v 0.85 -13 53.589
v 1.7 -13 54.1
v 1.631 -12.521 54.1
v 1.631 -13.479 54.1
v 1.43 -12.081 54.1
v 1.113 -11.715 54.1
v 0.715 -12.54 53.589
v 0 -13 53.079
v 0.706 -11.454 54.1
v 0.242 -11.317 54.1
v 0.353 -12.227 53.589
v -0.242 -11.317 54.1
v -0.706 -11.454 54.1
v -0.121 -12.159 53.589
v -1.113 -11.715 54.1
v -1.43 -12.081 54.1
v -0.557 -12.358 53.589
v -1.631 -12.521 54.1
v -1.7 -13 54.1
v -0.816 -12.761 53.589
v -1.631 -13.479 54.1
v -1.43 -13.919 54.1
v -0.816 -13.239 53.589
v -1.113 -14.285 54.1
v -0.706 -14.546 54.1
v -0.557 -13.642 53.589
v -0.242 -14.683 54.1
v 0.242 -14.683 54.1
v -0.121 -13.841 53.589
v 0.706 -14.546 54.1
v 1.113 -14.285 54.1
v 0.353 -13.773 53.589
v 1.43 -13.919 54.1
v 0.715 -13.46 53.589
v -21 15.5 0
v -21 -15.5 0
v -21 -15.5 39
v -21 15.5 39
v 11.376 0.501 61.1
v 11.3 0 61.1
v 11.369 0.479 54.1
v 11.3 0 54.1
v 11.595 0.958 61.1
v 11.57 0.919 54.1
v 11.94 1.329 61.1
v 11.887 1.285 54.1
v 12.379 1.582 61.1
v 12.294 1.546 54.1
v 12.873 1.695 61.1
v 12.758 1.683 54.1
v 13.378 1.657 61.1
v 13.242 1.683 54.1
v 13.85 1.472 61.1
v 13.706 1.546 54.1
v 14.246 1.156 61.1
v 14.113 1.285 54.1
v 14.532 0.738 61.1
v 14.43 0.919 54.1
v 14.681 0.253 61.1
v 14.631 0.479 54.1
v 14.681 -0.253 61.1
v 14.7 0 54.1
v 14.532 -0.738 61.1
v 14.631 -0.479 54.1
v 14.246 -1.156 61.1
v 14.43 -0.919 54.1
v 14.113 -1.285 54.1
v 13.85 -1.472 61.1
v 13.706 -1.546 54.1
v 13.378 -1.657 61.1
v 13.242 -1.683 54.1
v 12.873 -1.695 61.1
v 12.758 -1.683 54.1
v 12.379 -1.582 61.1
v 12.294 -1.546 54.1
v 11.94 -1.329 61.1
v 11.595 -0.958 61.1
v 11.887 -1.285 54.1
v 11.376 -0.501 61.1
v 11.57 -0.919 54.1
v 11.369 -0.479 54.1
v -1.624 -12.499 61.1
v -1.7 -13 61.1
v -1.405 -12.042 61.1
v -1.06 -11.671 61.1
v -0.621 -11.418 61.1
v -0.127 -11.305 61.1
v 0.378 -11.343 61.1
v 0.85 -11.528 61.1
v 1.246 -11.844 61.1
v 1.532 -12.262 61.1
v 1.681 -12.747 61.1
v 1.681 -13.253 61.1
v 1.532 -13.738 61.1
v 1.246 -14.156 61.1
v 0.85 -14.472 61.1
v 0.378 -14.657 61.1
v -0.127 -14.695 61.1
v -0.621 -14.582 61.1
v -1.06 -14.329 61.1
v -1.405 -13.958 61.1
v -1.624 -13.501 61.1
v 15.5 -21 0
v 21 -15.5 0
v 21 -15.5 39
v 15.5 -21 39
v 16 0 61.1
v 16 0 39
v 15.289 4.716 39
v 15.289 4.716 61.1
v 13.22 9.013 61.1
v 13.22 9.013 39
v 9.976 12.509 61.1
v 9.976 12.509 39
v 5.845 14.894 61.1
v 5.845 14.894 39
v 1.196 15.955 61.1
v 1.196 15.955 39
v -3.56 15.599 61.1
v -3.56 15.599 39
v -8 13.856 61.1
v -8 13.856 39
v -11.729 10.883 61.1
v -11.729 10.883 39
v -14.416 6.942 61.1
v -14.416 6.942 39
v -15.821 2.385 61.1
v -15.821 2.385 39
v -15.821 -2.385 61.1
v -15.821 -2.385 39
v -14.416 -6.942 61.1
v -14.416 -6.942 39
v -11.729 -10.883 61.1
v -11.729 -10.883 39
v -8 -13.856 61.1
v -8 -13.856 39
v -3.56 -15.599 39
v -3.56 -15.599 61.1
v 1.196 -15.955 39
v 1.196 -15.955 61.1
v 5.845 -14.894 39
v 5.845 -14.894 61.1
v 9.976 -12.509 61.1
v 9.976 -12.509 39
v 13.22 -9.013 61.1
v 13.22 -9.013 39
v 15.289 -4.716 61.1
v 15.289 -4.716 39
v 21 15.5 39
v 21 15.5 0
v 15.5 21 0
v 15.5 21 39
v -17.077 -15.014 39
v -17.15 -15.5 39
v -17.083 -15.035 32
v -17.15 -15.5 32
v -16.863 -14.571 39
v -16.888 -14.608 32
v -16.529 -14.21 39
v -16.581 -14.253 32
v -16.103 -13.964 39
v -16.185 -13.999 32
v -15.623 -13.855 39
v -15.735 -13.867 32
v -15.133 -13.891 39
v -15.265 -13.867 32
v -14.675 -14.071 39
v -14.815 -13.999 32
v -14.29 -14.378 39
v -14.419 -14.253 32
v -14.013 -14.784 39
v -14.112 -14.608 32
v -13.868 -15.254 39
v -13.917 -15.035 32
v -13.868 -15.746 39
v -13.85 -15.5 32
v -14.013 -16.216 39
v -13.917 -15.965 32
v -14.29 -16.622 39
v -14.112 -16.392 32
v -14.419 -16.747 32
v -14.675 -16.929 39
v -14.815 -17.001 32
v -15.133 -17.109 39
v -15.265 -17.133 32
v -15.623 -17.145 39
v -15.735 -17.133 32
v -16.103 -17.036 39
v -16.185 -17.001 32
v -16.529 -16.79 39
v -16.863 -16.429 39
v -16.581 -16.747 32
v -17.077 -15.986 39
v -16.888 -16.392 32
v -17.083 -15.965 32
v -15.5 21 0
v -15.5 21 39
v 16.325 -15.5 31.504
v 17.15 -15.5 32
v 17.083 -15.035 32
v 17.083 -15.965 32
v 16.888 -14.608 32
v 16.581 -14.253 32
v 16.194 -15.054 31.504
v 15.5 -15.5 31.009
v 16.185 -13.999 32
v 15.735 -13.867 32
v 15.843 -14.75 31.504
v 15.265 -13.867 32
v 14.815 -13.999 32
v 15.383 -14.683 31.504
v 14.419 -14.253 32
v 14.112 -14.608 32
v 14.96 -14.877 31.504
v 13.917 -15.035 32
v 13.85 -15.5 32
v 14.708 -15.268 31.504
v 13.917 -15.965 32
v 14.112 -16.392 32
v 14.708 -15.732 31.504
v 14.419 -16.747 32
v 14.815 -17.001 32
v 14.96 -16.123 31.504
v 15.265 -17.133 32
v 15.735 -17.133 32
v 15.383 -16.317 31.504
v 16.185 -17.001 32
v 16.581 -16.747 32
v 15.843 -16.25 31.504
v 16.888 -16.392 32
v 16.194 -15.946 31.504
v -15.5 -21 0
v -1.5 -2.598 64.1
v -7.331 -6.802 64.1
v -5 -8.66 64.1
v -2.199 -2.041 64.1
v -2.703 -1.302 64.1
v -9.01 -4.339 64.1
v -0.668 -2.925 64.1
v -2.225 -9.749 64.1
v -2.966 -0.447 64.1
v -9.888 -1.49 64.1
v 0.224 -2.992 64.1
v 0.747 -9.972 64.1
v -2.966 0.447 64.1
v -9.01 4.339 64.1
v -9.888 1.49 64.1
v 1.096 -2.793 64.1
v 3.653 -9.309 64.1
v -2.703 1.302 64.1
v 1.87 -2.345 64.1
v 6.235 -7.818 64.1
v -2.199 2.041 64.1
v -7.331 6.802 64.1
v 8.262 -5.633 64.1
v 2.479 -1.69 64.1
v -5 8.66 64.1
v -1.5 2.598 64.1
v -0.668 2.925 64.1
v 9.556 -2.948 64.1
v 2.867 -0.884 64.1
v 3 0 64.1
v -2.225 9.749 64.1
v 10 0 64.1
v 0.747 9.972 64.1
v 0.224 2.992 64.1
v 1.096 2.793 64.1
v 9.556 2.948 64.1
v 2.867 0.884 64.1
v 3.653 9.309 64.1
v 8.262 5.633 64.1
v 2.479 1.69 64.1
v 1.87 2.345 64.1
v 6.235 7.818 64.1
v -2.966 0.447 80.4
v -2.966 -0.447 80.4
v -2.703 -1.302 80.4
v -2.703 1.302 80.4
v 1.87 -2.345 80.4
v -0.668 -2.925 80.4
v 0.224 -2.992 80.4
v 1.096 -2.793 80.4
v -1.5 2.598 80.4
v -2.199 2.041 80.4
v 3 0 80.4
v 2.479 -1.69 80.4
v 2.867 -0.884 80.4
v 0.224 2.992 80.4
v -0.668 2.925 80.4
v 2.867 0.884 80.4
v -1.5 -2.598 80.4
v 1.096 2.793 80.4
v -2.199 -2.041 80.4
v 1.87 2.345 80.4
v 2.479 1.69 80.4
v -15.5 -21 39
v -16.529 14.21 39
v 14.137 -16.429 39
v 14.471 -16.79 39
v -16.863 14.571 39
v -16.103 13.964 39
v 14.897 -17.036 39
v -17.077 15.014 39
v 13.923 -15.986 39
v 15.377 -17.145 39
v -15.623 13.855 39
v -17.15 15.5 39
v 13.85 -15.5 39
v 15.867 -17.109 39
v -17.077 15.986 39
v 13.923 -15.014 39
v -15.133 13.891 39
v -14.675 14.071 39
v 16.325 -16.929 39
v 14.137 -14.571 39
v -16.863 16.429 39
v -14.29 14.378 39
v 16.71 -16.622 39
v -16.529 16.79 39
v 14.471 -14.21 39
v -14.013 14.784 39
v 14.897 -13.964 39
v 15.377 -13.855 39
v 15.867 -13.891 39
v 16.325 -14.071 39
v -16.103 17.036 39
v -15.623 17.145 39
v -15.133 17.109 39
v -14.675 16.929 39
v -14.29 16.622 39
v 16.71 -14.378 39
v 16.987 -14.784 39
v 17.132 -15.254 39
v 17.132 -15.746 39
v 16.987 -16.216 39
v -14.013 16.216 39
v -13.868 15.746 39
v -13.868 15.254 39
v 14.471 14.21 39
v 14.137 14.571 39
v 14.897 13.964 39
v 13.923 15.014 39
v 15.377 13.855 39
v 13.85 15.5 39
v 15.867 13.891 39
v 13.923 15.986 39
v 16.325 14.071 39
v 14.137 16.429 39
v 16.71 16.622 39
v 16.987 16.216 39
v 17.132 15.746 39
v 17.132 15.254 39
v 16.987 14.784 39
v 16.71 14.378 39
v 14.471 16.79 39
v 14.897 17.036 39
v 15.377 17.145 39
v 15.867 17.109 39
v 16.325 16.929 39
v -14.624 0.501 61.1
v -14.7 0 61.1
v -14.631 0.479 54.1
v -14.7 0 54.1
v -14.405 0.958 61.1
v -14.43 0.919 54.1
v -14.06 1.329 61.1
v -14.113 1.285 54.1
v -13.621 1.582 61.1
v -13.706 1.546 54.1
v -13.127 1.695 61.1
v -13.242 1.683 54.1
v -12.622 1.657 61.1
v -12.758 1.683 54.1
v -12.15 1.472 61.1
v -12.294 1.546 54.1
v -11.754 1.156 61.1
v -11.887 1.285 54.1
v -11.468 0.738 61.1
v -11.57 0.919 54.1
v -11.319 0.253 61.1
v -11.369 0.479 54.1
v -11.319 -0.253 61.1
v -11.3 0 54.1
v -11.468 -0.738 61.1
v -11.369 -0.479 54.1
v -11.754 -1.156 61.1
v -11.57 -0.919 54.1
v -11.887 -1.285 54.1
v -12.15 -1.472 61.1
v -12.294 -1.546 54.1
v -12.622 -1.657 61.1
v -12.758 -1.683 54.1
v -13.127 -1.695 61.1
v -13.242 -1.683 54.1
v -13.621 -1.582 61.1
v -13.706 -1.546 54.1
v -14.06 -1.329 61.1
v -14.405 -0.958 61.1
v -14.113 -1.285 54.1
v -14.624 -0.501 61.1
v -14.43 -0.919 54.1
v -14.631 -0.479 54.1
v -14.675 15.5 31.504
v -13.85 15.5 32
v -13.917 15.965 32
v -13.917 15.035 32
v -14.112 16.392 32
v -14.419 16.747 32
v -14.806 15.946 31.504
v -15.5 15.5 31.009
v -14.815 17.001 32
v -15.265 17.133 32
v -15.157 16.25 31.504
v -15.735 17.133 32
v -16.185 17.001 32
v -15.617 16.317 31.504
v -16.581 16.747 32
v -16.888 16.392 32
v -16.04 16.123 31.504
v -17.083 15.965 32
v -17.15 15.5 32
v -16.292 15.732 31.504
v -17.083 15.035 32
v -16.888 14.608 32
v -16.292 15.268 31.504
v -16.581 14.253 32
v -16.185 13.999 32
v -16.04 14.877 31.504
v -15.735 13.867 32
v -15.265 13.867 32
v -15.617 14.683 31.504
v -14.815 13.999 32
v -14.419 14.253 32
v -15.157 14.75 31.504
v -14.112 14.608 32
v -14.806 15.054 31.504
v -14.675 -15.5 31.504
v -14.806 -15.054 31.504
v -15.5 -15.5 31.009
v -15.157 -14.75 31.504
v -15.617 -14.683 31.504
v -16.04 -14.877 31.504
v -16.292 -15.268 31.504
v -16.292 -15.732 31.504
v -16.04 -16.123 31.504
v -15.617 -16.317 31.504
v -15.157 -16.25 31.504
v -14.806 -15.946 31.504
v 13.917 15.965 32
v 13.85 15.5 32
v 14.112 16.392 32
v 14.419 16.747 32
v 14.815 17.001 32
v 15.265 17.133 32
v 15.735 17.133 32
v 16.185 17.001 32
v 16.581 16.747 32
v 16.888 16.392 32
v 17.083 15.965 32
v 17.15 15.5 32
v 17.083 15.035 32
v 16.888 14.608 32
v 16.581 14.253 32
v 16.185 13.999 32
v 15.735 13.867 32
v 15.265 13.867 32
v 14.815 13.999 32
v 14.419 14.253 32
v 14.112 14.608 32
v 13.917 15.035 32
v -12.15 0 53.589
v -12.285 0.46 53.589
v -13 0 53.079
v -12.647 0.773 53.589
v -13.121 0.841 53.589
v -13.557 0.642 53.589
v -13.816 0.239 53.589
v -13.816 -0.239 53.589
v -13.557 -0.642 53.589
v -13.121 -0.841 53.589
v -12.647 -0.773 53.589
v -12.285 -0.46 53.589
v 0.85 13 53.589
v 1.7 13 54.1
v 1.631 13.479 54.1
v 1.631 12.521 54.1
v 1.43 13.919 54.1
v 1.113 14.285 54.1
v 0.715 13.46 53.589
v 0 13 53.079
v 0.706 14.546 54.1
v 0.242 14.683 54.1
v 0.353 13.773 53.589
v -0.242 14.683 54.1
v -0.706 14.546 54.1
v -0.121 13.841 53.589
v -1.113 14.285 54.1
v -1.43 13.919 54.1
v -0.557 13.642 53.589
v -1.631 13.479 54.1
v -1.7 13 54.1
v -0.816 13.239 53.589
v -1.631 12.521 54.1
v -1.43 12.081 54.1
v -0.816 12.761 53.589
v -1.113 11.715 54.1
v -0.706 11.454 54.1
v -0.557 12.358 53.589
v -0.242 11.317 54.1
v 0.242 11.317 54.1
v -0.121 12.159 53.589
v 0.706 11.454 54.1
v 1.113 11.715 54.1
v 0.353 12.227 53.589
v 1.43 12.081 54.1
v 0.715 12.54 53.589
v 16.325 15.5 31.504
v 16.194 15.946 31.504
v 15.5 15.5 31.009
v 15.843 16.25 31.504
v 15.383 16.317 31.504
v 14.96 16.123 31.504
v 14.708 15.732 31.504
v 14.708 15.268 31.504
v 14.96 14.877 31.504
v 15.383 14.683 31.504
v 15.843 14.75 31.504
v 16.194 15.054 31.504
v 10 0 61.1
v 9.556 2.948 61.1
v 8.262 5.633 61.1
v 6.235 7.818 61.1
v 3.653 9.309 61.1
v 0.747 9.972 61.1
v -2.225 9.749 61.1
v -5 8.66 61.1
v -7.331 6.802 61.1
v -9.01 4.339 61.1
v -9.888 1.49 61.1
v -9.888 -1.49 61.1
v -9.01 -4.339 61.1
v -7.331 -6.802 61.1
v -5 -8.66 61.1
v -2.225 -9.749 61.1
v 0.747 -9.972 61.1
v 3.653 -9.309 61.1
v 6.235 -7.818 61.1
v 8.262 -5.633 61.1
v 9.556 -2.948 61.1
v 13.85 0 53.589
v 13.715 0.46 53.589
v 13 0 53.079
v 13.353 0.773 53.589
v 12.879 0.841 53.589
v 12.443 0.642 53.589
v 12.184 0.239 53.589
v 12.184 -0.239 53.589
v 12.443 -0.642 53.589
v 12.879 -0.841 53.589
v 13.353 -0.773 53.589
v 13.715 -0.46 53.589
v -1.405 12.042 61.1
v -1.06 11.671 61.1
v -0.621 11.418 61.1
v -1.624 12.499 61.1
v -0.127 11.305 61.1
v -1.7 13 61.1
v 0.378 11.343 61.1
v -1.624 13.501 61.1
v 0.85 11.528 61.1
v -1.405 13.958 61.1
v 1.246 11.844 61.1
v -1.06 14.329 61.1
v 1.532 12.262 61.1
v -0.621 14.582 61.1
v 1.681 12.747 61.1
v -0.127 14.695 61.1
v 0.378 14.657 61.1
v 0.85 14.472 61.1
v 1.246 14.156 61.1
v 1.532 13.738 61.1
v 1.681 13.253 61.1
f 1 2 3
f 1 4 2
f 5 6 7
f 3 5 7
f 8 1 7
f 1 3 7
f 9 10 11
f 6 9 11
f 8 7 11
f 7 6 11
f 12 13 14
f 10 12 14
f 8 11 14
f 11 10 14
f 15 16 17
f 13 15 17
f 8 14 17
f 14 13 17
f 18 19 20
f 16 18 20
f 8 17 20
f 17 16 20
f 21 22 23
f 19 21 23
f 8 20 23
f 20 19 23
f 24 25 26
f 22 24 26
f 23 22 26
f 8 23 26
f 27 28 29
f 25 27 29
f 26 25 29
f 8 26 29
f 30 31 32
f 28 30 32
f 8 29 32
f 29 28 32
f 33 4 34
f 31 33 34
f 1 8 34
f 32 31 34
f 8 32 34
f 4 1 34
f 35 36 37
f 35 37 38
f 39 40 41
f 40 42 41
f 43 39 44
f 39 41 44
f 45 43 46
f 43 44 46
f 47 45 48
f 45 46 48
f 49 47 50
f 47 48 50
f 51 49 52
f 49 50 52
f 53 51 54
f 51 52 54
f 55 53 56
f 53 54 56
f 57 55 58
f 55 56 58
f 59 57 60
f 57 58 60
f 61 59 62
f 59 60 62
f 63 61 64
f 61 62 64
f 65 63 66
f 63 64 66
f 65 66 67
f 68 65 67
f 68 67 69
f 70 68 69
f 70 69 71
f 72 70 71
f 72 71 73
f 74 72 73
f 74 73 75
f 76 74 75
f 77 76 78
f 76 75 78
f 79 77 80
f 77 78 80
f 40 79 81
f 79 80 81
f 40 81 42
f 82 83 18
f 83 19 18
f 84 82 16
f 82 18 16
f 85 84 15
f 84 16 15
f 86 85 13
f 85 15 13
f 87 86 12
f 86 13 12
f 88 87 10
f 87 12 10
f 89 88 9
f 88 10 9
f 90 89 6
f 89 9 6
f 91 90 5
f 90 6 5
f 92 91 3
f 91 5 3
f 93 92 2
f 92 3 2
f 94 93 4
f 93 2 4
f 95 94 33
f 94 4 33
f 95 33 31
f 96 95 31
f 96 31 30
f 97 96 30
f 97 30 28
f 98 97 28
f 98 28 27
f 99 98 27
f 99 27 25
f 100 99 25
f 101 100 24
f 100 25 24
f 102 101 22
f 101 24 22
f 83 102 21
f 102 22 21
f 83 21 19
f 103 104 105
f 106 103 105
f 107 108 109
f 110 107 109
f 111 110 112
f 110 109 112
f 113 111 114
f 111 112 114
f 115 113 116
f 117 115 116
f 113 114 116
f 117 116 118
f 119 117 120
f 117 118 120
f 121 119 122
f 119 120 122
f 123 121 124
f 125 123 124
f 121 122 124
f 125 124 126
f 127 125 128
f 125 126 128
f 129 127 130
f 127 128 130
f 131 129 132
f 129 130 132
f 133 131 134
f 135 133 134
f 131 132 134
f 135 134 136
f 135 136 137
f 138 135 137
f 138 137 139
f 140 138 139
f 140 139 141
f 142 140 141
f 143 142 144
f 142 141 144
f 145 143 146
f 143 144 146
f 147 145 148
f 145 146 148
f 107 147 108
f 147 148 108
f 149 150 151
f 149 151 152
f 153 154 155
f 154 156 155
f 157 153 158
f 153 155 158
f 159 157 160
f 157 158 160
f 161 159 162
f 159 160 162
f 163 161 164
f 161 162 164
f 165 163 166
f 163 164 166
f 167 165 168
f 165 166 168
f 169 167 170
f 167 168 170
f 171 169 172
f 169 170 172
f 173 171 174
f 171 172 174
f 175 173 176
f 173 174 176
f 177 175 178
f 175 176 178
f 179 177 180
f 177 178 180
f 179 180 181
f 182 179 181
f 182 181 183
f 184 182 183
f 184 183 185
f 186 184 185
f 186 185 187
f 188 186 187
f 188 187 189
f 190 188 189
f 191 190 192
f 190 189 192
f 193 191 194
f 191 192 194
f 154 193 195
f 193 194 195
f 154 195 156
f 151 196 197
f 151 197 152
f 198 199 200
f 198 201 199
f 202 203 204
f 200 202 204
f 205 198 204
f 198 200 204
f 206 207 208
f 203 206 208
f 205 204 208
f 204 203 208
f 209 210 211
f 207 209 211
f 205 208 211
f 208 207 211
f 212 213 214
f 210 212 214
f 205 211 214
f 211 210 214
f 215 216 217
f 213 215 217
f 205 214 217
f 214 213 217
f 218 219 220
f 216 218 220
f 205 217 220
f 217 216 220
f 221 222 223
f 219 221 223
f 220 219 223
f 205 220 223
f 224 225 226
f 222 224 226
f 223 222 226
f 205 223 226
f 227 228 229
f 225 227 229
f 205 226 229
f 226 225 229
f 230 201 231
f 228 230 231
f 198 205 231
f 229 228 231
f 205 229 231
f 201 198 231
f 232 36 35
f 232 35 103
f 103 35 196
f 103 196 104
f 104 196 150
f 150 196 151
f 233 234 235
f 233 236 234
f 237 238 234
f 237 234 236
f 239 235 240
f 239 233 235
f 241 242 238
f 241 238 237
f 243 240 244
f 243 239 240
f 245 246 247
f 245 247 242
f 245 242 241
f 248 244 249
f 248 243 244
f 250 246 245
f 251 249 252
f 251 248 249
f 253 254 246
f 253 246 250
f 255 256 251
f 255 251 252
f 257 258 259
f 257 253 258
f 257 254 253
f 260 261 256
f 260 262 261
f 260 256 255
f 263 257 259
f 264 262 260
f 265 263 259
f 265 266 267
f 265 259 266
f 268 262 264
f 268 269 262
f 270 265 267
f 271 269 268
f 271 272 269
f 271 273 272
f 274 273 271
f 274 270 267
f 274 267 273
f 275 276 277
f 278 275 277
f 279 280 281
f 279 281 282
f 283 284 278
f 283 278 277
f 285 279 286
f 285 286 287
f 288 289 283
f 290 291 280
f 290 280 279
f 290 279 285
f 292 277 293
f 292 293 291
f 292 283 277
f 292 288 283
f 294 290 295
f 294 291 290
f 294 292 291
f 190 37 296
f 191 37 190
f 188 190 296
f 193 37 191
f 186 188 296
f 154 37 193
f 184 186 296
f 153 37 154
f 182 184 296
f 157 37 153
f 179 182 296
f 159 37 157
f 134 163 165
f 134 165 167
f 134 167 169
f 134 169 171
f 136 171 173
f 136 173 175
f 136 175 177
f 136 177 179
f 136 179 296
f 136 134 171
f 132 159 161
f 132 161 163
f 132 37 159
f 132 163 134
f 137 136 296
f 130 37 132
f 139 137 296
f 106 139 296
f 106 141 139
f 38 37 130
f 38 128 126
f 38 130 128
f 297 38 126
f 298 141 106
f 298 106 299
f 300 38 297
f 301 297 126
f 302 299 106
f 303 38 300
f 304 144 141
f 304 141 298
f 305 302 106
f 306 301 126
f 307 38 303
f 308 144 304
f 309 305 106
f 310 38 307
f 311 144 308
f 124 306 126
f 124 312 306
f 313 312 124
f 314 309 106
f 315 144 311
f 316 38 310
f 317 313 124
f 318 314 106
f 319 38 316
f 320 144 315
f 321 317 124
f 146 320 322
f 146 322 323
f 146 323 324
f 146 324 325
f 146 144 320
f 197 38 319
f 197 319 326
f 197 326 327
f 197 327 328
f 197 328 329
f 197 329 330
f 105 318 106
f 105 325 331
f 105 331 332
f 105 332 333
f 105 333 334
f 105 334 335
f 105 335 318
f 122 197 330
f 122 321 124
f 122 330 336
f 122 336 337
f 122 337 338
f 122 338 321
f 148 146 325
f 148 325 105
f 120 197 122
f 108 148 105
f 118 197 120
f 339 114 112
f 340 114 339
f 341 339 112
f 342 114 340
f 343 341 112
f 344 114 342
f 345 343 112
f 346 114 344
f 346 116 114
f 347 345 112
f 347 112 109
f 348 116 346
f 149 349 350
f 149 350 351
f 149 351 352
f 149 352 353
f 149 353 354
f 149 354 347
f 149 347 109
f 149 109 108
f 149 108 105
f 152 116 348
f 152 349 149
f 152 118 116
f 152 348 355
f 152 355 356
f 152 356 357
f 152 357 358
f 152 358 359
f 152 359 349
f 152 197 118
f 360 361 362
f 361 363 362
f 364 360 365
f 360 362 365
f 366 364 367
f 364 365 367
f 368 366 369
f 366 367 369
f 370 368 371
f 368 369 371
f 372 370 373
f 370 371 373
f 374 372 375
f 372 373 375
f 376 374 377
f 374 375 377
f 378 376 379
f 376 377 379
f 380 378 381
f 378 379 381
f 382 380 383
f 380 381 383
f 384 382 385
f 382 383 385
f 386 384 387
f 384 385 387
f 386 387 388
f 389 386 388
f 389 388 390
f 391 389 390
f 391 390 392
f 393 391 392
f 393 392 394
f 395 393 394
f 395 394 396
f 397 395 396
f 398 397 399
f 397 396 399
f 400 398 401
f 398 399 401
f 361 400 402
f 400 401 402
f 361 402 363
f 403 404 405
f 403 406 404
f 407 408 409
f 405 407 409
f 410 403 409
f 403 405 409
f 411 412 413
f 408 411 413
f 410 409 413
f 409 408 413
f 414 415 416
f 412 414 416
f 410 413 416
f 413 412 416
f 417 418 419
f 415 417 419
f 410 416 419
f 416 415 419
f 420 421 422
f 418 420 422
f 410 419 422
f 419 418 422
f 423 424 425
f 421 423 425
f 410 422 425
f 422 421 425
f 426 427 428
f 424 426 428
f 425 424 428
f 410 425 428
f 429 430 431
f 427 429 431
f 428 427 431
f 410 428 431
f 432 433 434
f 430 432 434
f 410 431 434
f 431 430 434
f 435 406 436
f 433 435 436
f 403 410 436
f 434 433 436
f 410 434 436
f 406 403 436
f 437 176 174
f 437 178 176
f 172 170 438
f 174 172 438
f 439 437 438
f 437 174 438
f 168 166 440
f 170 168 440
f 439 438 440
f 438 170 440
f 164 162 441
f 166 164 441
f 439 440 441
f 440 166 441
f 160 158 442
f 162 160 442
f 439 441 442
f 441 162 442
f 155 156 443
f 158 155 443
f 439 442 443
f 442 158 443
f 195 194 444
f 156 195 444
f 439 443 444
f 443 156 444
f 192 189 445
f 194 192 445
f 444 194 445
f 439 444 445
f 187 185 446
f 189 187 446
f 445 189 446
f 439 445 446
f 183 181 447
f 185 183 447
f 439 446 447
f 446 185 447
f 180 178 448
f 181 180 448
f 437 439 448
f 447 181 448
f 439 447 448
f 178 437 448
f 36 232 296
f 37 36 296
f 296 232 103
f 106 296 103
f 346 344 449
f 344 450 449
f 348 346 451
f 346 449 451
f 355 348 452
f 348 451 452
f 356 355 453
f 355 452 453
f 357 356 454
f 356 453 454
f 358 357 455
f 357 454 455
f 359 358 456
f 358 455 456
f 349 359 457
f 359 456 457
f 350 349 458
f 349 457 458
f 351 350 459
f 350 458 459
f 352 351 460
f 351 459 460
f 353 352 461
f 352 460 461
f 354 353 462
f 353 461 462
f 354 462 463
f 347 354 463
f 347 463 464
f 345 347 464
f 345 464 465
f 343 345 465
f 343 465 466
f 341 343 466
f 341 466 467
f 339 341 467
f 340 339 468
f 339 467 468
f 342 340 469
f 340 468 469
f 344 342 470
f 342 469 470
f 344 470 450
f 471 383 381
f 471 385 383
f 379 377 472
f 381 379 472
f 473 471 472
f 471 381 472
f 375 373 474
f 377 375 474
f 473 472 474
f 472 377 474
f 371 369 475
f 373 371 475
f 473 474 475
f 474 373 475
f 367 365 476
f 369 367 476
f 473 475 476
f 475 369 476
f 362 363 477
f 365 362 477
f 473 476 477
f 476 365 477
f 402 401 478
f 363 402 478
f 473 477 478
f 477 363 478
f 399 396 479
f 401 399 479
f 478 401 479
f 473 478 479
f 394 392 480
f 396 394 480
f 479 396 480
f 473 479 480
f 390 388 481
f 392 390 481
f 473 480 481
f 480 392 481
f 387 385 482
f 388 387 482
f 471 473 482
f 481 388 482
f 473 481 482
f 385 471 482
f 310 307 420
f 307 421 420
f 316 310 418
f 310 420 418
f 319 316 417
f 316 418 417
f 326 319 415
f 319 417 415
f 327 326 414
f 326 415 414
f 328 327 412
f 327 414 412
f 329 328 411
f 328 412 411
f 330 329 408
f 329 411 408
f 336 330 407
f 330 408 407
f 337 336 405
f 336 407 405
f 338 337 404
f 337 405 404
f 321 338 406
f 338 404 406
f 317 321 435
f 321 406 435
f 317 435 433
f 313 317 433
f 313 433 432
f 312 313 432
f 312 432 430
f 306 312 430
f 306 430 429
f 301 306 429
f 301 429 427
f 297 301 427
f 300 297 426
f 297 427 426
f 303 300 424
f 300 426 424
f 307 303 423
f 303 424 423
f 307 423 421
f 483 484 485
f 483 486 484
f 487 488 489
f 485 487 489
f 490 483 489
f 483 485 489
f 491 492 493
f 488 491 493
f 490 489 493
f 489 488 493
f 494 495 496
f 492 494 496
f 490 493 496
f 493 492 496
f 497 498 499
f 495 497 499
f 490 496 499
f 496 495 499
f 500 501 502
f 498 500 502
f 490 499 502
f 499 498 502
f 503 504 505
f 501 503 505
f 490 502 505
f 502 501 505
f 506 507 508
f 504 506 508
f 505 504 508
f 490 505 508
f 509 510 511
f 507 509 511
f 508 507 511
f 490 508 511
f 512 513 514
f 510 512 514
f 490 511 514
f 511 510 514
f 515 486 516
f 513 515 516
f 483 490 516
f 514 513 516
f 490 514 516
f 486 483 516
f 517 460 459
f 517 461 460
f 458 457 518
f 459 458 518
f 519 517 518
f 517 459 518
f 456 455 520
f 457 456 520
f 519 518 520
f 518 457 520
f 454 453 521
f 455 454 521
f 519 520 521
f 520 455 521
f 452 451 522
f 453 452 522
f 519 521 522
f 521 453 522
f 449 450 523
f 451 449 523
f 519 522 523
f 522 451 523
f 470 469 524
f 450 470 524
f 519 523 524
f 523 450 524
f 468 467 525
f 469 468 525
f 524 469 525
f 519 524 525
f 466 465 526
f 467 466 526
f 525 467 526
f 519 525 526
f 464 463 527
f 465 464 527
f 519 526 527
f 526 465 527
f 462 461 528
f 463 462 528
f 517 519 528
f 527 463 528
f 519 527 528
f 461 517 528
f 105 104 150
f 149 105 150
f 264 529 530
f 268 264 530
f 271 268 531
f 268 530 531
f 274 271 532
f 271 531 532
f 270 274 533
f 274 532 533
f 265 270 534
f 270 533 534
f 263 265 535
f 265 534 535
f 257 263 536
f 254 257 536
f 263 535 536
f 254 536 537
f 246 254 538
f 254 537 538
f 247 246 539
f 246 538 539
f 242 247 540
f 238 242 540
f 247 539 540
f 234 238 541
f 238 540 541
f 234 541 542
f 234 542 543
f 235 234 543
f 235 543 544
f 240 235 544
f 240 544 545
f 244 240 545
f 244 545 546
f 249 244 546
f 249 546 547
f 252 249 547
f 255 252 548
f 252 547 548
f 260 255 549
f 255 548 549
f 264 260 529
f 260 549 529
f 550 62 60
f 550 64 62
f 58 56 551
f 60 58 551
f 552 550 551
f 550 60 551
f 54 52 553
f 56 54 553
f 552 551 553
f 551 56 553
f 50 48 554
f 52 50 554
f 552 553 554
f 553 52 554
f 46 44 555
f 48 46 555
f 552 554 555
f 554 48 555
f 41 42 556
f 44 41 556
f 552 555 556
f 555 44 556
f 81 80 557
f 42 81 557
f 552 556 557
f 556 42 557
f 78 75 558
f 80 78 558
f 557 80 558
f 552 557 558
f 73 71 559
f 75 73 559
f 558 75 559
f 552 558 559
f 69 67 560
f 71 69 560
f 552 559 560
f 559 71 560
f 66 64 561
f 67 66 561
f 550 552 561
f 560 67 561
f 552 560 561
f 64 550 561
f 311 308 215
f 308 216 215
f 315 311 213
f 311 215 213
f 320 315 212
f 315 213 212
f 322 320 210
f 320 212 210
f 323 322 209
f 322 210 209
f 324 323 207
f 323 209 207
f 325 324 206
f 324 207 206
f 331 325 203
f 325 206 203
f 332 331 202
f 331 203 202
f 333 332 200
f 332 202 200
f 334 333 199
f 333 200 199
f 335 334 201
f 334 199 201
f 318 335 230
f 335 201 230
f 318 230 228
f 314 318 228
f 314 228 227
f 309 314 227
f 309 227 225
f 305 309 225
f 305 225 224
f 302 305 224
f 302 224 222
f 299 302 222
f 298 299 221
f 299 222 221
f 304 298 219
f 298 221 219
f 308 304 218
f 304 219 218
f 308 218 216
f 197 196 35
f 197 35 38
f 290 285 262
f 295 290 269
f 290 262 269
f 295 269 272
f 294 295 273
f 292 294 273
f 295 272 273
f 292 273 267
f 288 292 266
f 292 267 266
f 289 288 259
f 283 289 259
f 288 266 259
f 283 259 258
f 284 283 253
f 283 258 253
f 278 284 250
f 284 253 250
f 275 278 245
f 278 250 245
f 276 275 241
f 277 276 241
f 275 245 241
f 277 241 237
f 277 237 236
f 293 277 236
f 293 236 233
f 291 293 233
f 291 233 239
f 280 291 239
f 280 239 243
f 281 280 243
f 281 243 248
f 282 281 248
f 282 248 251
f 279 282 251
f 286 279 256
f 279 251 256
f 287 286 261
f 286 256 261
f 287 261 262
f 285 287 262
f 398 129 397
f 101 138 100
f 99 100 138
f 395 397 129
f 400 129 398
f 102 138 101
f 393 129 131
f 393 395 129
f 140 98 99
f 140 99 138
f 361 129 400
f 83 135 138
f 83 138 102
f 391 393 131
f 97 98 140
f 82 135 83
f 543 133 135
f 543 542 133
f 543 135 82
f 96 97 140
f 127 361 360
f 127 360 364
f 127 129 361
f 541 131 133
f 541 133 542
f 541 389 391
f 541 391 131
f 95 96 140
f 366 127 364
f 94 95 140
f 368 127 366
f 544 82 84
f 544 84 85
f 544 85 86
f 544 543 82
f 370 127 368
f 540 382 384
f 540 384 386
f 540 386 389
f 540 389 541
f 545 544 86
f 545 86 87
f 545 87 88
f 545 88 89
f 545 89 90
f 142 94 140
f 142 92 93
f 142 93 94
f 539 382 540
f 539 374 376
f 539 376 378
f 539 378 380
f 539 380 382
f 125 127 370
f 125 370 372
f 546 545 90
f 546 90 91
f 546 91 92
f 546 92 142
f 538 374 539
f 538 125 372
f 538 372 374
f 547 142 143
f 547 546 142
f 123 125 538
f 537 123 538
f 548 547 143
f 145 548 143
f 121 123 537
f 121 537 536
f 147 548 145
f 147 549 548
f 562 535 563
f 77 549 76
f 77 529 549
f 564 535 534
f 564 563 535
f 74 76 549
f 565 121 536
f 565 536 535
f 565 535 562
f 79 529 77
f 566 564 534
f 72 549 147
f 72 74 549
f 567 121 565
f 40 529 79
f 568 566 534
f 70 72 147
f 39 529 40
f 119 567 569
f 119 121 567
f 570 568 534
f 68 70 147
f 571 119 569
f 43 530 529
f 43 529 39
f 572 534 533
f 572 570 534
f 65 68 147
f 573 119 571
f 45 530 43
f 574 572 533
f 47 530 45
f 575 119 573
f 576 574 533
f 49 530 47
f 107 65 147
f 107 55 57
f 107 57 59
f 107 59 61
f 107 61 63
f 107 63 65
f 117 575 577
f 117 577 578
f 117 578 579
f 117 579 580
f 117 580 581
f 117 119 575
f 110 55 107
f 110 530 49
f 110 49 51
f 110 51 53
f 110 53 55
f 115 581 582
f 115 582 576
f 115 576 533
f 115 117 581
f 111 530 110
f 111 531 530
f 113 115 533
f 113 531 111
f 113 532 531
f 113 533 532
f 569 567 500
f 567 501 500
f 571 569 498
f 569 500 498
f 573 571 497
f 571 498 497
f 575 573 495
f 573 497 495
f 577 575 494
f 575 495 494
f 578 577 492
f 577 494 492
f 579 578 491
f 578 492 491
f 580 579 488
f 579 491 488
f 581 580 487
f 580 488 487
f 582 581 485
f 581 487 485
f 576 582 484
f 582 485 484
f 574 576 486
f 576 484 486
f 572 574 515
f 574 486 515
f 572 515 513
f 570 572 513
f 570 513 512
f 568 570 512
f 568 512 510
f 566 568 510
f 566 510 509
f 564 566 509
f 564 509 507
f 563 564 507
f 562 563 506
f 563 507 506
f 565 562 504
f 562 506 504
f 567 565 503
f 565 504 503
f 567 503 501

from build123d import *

# Parameters (mm, degrees)
F0_W      = 42
F0_H      = 42
F1_DEPTH  = 39
F2_R      = 16
F3_DEPTH  = 22.1
F4_R      = 10
F5_DEPTH  = 3
F6_R      = 3
F7_DEPTH  = 16.3
F8_SIZE   = 5.5
F10_D     = 3.3
F10_DEPTH = 7
F10_TIP   = 0.9914200214
F12_D     = 3.4
F12_DEPTH = 7
F12_TIP   = 1.0214630523


with BuildPart() as f1:
    # F0 (on Top) → F1 (new body)
    with BuildSketch(Plane.XY):
        Rectangle(F0_W, F0_H)
    extrude(amount=F1_DEPTH)

    # F2 (on face) → F3 (join)
    with BuildSketch(Plane.XY.offset(39)):
        Circle(F2_R)
    extrude(amount=F3_DEPTH)

    # F4 (on face) → F5 (join)
    with BuildSketch(Plane.XY.offset(61.1)):
        Circle(F4_R)
    extrude(amount=F5_DEPTH)

    # F6 (on face) → F7 (join)
    with BuildSketch(Plane.XY.offset(64.1)):
        Circle(F6_R)
    extrude(amount=F7_DEPTH)

    # F8
    f8_edges = [f1.edges().sort_by_distance(p)[0] for p in [
        (-21, 21, 19.5),
        (21, 21, 19.5),
        (21, -21, 19.5),
        (-21, -21, 19.5),
    ]]
    chamfer(f8_edges, length=F8_SIZE)

    # F10
    with Locations(Plane.XY.offset(39)):
        with Locations((-15.5, 15.5), (15.5, 15.5), (15.5, -15.5), (-15.5, -15.5)):
            Hole(F10_D / 2, depth=F10_DEPTH)
            with Locations((0, 0, -(F10_DEPTH + F10_TIP / 2))):  # 118° drill point
                Cone(0, F10_D / 2, F10_TIP, mode=Mode.SUBTRACT)

    # F12
    with Locations(Plane.XY.offset(61.1)):
        with Locations((0, 13), (-13, 0), (0, -13), (13, 0)):
            Hole(F12_D / 2, depth=F12_DEPTH)
            with Locations((0, 0, -(F12_DEPTH + F12_TIP / 2))):  # 118° drill point
                Cone(0, F12_D / 2, F12_TIP, mode=Mode.SUBTRACT)


solid = f1.part
